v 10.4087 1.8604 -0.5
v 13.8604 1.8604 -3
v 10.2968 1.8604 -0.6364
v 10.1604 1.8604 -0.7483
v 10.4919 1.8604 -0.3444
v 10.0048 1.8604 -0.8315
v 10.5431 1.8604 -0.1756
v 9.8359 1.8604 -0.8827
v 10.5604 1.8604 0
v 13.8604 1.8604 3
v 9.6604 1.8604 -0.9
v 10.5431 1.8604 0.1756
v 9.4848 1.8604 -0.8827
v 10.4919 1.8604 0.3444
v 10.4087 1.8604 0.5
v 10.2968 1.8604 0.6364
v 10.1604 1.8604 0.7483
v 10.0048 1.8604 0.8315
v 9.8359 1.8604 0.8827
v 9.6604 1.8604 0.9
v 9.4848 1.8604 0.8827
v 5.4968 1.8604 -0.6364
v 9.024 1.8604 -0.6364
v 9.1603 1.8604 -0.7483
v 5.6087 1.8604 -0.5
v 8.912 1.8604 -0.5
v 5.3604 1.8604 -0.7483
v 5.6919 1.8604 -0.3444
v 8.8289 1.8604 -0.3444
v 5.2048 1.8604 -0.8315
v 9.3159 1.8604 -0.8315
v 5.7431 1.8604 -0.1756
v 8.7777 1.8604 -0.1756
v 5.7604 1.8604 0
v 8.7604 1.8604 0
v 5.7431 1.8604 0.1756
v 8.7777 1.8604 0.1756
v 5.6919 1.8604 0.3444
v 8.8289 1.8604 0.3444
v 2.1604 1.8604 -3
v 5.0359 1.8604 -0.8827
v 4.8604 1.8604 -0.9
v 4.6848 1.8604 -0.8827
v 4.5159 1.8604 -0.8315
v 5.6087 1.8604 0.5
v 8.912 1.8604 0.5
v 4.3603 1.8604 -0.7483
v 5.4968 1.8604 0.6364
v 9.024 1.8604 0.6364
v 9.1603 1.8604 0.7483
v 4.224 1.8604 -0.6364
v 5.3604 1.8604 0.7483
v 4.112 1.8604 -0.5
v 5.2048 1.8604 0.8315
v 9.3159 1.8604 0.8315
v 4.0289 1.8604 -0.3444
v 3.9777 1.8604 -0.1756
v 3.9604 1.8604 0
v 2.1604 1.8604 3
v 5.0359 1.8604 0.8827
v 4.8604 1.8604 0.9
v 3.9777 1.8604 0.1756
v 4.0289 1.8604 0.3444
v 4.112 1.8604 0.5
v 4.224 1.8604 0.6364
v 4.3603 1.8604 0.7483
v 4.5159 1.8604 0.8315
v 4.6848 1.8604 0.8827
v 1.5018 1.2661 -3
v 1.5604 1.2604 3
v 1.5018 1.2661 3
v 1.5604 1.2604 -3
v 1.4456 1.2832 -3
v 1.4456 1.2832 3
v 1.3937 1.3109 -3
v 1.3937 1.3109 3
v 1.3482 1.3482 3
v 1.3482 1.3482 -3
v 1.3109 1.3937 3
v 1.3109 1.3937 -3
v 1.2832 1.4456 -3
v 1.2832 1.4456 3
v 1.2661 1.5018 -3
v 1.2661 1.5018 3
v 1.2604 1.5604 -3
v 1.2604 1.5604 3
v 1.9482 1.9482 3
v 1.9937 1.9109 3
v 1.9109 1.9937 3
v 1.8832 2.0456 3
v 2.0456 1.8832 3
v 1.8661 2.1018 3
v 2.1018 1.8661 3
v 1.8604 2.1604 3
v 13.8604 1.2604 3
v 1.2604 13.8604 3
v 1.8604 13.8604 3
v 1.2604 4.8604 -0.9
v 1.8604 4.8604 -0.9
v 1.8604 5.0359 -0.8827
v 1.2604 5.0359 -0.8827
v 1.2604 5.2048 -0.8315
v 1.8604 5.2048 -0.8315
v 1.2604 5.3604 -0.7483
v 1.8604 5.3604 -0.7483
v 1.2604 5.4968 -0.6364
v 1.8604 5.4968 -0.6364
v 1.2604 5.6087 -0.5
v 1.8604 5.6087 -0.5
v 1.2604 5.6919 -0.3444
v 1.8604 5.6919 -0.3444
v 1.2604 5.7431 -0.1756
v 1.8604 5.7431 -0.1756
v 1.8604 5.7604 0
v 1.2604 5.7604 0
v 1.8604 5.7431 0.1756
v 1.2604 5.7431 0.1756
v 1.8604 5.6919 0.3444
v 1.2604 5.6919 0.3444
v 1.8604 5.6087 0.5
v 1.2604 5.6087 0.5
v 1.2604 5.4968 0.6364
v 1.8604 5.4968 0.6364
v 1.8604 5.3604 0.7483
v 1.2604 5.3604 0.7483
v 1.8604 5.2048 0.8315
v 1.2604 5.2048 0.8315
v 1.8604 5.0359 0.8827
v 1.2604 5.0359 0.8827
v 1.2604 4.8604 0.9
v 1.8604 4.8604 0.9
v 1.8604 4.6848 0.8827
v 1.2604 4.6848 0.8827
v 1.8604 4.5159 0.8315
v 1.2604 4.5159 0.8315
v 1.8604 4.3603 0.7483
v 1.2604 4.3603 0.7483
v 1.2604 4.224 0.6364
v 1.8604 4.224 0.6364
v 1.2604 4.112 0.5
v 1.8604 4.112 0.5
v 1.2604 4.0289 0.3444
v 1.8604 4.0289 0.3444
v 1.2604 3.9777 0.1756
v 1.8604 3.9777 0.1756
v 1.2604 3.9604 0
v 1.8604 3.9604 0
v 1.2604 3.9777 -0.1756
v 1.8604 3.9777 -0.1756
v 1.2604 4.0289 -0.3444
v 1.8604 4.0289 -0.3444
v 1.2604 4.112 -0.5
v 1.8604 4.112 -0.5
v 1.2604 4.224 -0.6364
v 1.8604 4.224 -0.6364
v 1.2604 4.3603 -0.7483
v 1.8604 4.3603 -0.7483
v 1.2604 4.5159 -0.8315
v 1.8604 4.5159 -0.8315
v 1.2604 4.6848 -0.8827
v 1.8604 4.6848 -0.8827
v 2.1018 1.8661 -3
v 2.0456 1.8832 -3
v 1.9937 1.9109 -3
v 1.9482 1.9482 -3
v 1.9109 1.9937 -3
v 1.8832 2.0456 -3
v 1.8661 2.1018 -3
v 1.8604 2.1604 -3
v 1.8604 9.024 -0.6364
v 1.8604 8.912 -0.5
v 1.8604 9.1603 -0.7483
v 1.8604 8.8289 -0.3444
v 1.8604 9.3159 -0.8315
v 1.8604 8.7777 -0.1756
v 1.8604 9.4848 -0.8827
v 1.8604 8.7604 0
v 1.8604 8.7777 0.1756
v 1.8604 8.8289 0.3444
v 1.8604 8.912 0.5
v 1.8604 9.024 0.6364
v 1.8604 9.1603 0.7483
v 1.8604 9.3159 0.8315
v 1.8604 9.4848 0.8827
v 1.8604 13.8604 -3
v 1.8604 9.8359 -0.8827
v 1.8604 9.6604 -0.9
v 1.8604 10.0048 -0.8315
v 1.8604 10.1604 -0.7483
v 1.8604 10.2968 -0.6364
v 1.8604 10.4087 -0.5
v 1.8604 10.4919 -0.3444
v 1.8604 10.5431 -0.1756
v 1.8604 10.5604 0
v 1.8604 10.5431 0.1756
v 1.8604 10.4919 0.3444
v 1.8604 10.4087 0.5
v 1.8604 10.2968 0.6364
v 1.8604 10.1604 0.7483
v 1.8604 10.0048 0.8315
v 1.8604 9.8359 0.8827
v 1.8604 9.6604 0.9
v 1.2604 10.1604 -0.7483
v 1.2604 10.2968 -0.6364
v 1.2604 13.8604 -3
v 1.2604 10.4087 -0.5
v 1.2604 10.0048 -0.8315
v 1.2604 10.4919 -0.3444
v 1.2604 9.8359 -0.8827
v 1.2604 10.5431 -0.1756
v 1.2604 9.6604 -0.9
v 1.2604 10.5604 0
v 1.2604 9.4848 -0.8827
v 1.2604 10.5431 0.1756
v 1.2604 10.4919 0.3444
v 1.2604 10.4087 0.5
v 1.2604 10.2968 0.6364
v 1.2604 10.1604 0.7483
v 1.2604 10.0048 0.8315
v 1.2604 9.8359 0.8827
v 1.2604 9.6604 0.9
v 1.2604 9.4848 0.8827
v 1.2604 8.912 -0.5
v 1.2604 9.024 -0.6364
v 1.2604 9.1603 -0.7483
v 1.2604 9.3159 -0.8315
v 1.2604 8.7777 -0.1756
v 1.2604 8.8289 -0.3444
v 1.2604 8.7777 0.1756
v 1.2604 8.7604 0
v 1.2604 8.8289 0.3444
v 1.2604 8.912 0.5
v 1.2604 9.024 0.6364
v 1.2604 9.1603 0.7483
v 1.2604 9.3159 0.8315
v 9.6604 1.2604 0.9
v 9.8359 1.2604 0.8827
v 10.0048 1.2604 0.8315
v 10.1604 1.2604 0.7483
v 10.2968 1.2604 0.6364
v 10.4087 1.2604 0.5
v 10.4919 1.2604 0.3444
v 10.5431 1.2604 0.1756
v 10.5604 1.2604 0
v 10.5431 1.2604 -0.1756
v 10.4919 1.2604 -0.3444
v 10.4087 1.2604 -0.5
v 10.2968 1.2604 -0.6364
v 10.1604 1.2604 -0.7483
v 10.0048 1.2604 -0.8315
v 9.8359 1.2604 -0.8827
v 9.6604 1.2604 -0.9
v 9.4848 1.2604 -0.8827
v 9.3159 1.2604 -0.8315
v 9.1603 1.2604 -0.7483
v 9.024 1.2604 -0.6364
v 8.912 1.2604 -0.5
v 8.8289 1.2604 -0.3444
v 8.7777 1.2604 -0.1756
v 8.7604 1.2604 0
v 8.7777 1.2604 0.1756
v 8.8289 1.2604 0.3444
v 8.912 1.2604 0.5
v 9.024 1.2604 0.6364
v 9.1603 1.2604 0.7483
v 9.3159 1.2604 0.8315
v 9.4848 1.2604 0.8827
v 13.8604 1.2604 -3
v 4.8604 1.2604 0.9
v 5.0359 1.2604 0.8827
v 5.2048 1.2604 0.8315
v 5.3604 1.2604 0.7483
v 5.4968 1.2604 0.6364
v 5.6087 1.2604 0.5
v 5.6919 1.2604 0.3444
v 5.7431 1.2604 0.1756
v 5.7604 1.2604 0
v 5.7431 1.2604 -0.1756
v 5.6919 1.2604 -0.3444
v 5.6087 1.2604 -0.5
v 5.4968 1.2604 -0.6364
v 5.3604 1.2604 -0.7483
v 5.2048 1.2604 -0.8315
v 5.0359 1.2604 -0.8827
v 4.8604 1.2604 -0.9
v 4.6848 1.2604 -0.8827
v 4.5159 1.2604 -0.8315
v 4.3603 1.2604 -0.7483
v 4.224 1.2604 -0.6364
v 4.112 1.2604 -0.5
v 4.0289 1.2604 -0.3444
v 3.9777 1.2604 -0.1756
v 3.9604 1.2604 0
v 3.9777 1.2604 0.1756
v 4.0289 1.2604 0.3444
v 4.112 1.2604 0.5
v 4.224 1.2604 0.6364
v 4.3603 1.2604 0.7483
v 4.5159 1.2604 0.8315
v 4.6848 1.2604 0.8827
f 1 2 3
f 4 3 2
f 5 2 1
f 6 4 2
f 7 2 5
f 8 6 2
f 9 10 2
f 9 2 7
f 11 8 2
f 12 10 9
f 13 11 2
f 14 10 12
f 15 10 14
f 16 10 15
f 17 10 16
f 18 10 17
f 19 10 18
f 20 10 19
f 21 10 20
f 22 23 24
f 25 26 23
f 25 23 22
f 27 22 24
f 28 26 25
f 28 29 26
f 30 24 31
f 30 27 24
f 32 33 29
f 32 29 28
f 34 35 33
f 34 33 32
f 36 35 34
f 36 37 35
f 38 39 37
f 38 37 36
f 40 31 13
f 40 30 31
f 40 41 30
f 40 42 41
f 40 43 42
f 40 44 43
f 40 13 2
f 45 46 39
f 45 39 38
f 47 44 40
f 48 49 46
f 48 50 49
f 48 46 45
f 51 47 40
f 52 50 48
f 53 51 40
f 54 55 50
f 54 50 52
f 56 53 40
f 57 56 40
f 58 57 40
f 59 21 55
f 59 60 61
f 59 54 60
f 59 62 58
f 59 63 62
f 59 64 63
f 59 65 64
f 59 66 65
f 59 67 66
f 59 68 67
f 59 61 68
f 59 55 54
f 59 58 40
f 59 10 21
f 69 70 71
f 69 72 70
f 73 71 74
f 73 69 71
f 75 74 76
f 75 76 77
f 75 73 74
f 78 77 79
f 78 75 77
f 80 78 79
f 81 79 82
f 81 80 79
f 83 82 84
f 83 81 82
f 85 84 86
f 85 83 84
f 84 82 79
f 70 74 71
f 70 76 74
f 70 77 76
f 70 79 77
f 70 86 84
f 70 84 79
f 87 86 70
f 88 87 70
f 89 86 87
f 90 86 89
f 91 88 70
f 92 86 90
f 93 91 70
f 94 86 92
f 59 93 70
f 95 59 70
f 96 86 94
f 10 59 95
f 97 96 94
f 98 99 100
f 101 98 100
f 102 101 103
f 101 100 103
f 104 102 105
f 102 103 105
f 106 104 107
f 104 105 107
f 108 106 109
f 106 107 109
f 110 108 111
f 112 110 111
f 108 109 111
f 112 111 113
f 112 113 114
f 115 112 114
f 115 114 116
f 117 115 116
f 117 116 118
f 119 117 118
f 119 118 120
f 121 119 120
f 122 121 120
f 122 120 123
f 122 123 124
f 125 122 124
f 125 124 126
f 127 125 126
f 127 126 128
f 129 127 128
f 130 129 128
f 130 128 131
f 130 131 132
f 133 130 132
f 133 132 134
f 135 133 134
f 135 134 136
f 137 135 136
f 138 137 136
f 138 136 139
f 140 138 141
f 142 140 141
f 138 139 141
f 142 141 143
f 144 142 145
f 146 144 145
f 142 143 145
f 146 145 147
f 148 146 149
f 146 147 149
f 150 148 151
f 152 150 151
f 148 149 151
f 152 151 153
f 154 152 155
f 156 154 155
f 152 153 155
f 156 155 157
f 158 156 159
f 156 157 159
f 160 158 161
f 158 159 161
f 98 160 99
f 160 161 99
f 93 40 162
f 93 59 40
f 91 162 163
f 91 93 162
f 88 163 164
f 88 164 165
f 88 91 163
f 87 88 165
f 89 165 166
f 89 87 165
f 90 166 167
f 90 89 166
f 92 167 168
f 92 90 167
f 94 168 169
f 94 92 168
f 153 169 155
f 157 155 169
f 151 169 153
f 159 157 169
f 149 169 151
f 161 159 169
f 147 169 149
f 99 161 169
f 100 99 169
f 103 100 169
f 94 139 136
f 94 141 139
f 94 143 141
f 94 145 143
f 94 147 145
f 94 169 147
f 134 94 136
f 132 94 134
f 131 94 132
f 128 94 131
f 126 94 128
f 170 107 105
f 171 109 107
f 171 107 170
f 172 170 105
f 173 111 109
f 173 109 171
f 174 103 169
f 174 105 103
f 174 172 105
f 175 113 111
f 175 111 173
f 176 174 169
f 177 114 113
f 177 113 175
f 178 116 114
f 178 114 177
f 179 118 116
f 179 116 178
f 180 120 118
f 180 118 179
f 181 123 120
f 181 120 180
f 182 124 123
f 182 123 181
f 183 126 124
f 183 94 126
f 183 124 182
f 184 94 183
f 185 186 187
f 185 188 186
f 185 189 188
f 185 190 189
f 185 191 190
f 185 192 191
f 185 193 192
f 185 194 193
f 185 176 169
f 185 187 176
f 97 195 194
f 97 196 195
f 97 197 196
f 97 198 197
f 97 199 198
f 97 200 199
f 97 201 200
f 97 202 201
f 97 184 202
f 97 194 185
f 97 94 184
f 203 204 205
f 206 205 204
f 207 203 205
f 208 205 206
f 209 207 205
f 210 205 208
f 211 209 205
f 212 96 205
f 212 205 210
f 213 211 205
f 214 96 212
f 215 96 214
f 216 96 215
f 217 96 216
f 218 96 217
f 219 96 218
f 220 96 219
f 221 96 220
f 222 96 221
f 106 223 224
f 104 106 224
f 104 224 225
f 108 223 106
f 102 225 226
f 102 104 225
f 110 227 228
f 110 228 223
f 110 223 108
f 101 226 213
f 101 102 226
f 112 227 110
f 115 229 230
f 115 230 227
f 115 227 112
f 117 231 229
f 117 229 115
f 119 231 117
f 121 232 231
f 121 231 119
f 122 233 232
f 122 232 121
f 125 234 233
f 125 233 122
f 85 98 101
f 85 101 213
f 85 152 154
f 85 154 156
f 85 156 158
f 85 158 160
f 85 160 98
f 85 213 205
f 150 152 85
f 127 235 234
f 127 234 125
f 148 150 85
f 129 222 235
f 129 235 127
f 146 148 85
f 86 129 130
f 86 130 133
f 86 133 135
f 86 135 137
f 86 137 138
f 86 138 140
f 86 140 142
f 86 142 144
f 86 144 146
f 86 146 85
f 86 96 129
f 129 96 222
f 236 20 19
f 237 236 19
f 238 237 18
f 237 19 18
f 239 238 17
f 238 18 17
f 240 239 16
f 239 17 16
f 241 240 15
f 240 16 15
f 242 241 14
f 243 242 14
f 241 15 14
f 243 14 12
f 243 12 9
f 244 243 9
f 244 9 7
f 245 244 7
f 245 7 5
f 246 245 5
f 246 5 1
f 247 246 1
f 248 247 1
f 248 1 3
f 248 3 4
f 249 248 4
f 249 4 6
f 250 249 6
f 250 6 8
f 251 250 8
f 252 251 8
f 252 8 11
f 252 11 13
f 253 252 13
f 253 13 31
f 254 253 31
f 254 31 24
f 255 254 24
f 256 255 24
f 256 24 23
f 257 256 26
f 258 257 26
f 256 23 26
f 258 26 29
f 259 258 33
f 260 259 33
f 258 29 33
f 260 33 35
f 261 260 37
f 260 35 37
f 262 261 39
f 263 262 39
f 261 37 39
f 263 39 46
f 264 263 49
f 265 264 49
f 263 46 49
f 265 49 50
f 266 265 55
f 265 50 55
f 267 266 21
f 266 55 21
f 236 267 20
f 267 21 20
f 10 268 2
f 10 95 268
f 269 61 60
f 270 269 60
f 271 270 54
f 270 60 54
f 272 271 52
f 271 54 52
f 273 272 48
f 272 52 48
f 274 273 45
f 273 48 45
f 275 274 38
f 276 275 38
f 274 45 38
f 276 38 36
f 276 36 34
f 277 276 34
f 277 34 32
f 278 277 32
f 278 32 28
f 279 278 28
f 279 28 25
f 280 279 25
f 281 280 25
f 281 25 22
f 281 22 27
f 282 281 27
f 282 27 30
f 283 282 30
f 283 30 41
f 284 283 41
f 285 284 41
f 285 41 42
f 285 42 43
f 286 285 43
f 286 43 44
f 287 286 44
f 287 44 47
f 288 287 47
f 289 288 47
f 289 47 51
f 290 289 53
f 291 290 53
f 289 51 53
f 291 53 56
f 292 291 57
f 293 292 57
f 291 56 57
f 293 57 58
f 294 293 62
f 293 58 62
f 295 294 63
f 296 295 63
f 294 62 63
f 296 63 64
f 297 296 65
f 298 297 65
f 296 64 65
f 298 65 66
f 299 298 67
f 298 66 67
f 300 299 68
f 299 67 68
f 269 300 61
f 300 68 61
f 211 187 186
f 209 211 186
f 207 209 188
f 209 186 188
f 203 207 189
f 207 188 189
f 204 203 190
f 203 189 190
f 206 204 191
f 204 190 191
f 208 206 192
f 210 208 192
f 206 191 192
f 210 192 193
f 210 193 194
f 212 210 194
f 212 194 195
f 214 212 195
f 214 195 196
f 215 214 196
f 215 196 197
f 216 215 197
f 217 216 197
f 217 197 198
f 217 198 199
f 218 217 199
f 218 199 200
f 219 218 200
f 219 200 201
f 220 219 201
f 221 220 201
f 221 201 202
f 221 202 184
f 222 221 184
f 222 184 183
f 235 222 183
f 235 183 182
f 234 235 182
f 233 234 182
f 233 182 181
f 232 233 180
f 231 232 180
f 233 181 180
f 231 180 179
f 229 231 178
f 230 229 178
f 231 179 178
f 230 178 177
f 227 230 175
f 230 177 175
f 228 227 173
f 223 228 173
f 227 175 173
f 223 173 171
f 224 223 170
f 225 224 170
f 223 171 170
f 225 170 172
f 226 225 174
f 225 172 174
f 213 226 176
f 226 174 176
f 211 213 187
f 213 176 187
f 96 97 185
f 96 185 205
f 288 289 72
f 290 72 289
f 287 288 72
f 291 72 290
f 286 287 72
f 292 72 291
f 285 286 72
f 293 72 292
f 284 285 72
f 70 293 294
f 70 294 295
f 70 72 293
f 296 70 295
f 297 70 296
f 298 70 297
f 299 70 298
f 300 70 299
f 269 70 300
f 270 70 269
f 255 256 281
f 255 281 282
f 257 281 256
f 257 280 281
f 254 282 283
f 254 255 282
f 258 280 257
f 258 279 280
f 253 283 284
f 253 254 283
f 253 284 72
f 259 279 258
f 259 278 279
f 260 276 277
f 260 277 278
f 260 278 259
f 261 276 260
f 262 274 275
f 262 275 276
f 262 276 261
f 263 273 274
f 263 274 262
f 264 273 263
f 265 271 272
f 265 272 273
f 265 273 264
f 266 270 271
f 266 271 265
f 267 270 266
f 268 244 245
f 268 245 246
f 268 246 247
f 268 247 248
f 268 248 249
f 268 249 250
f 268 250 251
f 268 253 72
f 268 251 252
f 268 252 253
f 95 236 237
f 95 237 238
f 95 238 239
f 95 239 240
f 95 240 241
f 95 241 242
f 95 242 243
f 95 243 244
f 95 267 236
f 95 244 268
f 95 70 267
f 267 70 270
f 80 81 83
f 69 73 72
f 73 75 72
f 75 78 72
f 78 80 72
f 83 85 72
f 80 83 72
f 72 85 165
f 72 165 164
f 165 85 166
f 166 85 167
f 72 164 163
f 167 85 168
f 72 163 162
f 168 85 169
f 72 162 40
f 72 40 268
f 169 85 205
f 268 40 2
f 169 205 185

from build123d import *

# Parameters (mm, degrees)
EKSTR_ZYON_NCE1_DEPTH = 5
RADYUS1_R             = 0.5
IZIM2_R               = 1.5
KES_EKSTR_ZYON1_DEPTH = 10
IZIM4_R               = 1.5
KES_EKSTR_ZYON2_DEPTH = 10
SCALE3_SCALE          = 0.6


with BuildPart() as part:
    # Çizim1 → Ekstrüzyon-İnce1 (new, symmetric)
    with BuildSketch(Plane.XY):
        Polygon((20, 0), (0, 0), (0, 20), (-1, 20), (-1, -1), (20, -1), align=None)
    extrude(amount=EKSTR_ZYON_NCE1_DEPTH, both=True)

    # Radyus1
    radyus1_edges = [part.edges().sort_by_distance(p)[0] for p in [
        (-1, -1, 0),
        (0, 0, 0),
    ]]
    fillet(radyus1_edges, radius=RADYUS1_R)

    # Çizim2 → Kes-Ekstrüzyon1 (cut)
    with BuildSketch(Plane(origin=(0, 0, 0), x_dir=(0, 0, -1), z_dir=(1, 0, 0))):
        with Locations((0, 13)):
            Circle(IZIM2_R)
        with Locations((0, 5)):
            Circle(IZIM2_R)
    extrude(amount=-KES_EKSTR_ZYON1_DEPTH, mode=Mode.SUBTRACT)

    # Çizim4 → Kes-Ekstrüzyon2 (cut)
    with BuildSketch(Plane(origin=(0, 0, 0), x_dir=(1, 0, 0), z_dir=(0, 1, 0))):
        with Locations(Location((5, 0, 0), (0, 0, 270))):
            Circle(IZIM4_R)
        with Locations(Location((13, 0, 0), (0, 0, 270))):
            Circle(IZIM4_R)
    extrude(amount=-KES_EKSTR_ZYON2_DEPTH, mode=Mode.SUBTRACT)


with BuildPart() as part_1:
    # Scale3: scaled about (4.650907034, 4.650907034, 0)
    add(part.part.scale(SCALE3_SCALE).moved(Location((1.860362814, 1.860362814, 0))))


solid = part_1.part
